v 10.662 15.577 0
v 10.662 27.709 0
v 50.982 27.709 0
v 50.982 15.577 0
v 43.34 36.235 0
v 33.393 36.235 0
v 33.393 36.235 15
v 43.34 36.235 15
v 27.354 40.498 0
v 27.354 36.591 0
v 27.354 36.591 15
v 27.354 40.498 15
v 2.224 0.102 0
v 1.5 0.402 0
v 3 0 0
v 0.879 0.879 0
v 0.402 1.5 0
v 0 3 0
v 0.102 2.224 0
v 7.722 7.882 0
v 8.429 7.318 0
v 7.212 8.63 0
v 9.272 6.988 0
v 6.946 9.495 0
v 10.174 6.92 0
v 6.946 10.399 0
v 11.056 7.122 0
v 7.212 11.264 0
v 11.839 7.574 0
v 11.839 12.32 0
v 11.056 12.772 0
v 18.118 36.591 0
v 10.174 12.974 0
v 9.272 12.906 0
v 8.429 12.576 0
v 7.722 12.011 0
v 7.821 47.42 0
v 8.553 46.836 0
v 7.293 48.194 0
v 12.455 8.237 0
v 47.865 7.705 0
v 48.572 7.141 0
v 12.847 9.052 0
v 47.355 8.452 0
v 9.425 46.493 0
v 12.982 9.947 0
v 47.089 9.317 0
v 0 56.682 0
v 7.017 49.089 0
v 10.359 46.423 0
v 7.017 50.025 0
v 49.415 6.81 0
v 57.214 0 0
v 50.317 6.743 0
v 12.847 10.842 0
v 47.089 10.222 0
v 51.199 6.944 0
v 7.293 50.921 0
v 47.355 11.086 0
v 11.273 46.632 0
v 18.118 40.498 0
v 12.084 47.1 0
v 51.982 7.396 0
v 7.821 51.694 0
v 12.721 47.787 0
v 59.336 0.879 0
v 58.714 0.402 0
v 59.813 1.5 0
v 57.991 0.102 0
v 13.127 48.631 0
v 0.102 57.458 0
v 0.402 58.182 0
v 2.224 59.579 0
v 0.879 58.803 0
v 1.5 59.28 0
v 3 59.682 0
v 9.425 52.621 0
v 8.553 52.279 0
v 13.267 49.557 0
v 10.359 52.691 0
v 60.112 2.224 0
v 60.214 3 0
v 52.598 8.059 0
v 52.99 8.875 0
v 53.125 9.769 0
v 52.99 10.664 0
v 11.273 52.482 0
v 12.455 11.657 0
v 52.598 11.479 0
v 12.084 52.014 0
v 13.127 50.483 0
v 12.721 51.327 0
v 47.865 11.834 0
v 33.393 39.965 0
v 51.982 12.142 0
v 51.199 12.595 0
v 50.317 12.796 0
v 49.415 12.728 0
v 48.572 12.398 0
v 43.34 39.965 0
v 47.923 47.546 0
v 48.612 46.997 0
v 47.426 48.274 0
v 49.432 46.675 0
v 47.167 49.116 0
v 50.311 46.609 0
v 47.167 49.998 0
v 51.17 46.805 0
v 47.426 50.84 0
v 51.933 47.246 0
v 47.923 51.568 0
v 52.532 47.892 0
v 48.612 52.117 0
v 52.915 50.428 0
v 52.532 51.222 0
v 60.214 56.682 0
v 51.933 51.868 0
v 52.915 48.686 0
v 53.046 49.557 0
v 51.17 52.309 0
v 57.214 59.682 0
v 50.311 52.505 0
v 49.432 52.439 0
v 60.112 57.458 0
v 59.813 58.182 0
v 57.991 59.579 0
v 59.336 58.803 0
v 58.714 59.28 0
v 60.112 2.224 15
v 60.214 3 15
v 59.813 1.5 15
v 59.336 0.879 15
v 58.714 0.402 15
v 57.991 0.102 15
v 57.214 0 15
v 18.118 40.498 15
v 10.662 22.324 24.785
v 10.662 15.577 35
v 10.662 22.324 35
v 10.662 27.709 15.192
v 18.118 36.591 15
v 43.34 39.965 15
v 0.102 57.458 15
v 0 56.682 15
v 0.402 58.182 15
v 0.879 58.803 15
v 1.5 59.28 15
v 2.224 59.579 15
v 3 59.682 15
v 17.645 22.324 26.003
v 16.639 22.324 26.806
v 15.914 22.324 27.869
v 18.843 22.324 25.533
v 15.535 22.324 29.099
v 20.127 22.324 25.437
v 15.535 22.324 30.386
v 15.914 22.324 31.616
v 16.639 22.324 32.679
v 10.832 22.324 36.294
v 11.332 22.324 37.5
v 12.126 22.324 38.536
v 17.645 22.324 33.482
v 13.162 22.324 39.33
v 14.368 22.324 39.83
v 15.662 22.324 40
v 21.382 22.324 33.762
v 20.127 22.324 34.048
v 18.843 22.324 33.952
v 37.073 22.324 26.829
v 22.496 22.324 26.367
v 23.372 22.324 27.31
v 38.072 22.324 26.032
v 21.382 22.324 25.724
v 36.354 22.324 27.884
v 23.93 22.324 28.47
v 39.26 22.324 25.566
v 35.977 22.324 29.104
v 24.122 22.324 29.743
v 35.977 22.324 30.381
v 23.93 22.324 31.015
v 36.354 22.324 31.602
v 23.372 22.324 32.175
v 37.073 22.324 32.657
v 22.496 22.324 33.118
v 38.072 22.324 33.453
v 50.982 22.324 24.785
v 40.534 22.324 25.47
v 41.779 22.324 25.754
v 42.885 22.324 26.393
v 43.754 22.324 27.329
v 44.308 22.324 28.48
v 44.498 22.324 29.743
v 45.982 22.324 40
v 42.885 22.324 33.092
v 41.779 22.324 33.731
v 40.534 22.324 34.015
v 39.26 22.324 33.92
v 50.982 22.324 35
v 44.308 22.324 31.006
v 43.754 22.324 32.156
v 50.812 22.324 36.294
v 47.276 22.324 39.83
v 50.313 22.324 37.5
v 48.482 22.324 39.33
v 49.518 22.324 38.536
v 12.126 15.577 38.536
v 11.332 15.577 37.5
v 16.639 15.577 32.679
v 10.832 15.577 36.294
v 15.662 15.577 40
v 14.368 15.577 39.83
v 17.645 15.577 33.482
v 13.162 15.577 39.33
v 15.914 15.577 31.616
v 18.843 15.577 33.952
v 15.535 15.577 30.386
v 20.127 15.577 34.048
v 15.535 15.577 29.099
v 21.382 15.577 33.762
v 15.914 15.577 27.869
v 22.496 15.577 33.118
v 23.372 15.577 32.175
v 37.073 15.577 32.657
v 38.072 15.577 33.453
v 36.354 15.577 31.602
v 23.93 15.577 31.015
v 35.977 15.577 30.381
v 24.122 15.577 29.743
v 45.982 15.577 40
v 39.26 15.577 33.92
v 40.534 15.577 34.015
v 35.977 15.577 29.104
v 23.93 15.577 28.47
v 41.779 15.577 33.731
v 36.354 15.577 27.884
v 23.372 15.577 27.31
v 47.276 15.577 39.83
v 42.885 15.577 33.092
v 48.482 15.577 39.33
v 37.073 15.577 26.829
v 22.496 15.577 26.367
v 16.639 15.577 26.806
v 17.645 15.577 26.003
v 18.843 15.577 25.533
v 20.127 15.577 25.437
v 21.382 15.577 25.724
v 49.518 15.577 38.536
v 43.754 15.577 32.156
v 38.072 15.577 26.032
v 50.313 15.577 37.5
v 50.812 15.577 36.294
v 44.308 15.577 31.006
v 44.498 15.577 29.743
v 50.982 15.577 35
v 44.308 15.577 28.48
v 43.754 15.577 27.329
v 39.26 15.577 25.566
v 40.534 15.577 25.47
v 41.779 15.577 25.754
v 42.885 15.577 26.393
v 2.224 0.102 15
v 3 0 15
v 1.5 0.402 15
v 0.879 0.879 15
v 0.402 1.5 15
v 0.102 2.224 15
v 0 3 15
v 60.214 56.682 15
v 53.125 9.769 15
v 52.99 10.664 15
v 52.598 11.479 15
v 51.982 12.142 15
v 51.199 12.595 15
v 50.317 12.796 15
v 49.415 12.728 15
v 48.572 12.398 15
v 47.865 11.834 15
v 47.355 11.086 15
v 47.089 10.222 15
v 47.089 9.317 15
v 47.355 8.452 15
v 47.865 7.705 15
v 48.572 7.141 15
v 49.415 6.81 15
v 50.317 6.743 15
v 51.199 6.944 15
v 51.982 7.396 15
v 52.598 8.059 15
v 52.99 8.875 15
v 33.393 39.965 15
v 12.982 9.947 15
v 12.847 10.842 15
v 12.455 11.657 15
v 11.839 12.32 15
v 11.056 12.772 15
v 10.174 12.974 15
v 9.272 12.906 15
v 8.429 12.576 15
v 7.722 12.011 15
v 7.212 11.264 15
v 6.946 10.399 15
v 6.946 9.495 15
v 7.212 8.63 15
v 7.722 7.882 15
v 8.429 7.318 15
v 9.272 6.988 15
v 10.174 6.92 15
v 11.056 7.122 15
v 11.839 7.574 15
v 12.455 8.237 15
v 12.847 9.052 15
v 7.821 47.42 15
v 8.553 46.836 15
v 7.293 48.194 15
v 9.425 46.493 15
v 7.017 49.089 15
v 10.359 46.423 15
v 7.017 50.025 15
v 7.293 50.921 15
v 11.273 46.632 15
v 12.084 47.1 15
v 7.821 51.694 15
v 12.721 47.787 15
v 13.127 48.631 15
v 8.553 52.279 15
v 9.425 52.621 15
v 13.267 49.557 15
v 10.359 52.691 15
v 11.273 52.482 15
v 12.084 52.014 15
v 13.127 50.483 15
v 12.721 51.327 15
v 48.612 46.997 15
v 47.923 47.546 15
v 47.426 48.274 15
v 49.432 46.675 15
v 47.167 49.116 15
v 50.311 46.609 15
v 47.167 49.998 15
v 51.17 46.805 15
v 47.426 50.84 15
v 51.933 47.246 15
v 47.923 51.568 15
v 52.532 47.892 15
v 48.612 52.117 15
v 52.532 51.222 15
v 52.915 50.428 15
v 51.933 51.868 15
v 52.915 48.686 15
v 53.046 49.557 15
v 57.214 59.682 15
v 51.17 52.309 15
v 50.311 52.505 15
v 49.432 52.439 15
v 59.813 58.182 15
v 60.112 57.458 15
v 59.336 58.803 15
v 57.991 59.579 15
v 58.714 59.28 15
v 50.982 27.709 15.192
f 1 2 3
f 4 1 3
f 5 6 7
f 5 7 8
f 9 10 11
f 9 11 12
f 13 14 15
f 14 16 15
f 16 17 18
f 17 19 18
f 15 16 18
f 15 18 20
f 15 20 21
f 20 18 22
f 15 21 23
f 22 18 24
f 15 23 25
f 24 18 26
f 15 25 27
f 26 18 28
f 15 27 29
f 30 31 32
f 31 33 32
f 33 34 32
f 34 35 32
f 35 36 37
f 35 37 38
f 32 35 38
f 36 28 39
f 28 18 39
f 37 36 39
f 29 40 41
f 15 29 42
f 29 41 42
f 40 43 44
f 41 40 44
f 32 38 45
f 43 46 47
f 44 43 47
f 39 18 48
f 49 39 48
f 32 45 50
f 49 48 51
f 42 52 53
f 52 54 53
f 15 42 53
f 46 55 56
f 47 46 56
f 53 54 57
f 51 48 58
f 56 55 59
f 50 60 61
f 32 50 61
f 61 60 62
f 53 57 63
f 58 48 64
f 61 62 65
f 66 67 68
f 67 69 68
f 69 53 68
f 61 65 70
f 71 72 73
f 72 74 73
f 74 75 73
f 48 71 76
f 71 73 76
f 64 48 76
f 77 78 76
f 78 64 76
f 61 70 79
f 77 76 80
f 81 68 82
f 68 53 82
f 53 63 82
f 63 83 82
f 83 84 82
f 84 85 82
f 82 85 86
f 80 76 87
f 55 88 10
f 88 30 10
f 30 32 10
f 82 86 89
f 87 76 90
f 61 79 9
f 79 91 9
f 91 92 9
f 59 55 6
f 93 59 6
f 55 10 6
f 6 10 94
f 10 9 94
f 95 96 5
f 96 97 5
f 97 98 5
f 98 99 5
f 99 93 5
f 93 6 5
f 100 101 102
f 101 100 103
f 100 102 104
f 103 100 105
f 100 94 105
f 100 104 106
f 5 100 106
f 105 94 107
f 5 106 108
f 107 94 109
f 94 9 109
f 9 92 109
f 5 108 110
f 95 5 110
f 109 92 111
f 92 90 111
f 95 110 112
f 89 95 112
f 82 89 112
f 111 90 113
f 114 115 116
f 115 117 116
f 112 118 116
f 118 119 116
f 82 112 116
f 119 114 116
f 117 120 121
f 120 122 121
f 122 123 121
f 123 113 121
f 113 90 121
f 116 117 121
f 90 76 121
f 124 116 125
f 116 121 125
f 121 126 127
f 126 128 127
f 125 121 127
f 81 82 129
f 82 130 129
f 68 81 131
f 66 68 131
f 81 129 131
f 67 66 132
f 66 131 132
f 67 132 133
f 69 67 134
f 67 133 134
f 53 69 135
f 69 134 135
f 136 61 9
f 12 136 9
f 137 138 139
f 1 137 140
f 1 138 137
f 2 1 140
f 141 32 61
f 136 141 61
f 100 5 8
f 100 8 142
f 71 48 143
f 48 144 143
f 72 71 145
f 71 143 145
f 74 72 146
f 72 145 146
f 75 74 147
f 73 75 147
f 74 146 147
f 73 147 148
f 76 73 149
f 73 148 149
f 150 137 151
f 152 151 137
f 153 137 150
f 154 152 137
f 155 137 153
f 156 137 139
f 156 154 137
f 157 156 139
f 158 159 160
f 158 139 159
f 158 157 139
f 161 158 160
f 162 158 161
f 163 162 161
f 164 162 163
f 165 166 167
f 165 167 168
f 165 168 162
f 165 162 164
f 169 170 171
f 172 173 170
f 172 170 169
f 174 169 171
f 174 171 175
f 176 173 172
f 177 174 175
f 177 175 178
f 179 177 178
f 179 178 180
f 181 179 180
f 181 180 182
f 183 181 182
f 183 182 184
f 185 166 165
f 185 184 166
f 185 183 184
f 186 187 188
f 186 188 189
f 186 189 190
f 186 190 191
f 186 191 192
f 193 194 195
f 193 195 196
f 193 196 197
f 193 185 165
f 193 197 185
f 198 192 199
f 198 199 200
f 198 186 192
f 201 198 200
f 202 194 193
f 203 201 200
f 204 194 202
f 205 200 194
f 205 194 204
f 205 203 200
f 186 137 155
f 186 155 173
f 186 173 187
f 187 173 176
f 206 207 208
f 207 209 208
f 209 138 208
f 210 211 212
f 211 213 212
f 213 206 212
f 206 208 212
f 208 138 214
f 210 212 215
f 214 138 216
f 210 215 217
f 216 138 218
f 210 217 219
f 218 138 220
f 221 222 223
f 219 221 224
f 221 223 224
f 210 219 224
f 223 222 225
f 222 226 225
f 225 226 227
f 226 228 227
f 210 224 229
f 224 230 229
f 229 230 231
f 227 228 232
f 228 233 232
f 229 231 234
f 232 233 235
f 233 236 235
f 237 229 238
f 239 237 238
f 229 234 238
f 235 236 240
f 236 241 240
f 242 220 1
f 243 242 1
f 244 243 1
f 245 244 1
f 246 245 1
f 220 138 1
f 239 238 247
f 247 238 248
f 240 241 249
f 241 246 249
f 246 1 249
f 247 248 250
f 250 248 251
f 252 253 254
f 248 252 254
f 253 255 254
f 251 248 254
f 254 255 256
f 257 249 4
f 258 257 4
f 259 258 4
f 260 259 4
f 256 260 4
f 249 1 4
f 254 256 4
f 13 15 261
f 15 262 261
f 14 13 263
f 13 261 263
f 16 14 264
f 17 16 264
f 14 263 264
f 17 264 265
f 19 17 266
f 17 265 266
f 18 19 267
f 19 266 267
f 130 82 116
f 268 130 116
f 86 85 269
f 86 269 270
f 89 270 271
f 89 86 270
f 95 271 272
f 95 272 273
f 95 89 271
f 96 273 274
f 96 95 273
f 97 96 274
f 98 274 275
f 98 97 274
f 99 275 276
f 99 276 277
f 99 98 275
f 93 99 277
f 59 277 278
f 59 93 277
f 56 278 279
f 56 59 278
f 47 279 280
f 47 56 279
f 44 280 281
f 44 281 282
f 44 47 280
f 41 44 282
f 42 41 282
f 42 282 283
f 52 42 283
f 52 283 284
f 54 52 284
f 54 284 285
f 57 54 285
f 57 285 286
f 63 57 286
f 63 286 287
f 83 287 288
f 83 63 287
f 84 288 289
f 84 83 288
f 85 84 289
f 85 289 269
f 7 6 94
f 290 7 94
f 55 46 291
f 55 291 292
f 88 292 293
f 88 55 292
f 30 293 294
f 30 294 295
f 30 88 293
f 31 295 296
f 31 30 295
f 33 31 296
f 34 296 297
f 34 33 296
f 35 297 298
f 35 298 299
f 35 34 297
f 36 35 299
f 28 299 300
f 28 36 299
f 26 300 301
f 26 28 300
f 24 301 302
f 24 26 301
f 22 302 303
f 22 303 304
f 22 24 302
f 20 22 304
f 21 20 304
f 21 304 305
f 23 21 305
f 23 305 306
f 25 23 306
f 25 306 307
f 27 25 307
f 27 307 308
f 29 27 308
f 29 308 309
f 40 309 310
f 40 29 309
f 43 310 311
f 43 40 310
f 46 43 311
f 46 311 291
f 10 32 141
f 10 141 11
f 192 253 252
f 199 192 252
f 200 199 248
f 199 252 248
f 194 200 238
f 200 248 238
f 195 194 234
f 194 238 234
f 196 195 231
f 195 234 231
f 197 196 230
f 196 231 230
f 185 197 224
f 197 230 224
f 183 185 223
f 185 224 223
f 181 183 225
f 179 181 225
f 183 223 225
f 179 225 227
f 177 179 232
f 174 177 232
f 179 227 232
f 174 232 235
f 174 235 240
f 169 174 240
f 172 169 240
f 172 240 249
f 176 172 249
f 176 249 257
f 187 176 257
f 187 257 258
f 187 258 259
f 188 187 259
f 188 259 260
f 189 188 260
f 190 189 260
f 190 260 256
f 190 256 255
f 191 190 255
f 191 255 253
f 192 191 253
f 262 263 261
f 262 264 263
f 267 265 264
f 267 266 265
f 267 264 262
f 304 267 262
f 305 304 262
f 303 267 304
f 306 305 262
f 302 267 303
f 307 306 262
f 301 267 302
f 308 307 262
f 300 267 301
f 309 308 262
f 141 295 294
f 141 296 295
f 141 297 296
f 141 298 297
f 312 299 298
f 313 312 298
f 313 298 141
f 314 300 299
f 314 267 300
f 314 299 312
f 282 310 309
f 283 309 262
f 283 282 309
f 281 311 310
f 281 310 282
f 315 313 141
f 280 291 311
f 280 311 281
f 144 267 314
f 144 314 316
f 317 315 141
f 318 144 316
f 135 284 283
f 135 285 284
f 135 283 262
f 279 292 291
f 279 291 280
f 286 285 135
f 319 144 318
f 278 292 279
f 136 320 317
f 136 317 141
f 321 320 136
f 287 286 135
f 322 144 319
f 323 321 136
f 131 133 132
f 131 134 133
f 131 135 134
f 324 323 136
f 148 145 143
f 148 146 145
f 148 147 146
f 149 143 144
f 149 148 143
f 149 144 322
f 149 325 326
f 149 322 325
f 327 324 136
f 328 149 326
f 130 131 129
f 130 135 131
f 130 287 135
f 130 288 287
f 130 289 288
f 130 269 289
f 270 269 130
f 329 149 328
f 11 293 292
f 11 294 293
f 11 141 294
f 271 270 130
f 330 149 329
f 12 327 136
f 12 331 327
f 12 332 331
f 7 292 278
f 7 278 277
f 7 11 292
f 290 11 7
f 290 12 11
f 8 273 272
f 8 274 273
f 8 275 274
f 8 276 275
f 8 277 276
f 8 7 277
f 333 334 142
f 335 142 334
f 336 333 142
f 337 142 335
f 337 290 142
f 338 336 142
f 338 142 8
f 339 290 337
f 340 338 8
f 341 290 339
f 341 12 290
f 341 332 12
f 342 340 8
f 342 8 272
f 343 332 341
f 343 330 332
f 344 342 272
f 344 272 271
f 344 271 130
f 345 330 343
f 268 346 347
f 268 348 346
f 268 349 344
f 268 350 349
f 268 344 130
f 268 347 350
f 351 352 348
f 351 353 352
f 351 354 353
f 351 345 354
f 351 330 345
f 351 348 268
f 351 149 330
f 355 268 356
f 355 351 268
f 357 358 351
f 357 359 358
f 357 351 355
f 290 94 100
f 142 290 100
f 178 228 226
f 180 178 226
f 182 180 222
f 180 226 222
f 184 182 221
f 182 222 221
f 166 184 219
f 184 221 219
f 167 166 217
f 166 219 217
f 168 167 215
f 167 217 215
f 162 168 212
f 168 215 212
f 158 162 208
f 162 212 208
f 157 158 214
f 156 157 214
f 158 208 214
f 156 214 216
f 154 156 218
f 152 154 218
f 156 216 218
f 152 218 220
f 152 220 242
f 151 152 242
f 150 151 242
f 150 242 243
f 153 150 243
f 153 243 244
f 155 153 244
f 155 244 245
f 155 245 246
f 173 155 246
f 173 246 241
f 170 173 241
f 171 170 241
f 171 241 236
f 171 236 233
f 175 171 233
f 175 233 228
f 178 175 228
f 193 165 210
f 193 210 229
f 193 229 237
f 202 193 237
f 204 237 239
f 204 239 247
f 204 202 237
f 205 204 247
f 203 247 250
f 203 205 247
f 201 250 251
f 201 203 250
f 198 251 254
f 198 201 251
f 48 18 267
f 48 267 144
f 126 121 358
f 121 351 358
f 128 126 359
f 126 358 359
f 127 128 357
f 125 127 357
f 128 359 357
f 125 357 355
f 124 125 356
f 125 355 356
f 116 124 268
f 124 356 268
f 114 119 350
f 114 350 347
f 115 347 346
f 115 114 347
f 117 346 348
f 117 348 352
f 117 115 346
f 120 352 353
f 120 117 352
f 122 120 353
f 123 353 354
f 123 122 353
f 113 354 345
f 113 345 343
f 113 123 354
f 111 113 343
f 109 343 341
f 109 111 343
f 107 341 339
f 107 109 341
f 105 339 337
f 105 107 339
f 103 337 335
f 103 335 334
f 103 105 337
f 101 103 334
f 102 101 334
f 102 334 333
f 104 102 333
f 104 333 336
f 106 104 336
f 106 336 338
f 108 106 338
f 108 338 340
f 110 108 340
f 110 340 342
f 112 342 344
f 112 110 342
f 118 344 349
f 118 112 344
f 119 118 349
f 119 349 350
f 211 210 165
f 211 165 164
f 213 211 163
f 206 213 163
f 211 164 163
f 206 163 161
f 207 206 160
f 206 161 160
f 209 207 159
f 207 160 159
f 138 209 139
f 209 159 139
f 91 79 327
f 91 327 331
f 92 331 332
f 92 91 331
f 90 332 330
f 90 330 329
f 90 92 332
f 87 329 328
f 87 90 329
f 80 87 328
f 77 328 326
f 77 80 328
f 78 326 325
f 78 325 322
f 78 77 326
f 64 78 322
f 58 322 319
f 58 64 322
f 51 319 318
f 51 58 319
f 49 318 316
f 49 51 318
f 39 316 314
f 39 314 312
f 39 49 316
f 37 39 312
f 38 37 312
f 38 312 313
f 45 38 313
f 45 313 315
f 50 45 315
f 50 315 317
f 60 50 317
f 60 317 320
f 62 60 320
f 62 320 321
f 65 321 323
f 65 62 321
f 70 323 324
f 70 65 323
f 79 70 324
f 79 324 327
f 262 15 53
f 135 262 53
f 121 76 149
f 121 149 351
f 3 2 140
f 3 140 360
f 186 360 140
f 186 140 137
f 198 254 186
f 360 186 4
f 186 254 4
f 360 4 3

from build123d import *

# Parameters (mm, degrees)
SKETCH001_W     = 40.320626
SKETCH001_H     = 12.132678
PAD001_DEPTH    = 40
SKETCH002_R     = 4.317623
SKETCH002_R_2   = 4.284413
POCKET_DEPTH    = 20
POCKET001_DEPTH = 50
FILLET_R        = 5
FILLET001_R     = 5
SKETCH_W        = 60.214462
SKETCH_H        = 59.681602
SKETCH_R        = 3.142494
SKETCH_R_2      = 2.956232
SKETCH_R_3      = 3.035228
SKETCH_R_4      = 3.035232
SKETCH_W_2      = 9.236439
SKETCH_H_2      = 3.907723
SKETCH_W_3      = 9.946926
SKETCH_H_3      = 3.730095
PAD_DEPTH       = 15
FILLET002_R     = 3
FILLET003_R     = 3
FILLET004_R     = 3
FILLET005_R     = 3


with BuildPart() as fillet001:
    # Sketch001 → Pad001 (new body)
    with BuildSketch(Plane.XY):
        with Locations((30.822077, 21.642973)):
            Rectangle(SKETCH001_W, SKETCH001_H)
    extrude(amount=PAD001_DEPTH)

    # Sketch002 → Pocket (cut)
    with BuildSketch(Plane.XZ.offset(-15.576634)):
        with Locations((19.804171, 29.742664)):
            Circle(SKETCH002_R)
        with Locations((40.213741, 29.742664)):
            Circle(SKETCH002_R_2)
    extrude(amount=-POCKET_DEPTH, mode=Mode.SUBTRACT)

    # Sketch004 → Pocket001 (cut)
    with BuildSketch(Plane.YZ.offset(50.98239)):
        Polygon((28.077049, 14.53677), (22.323629, 24.785055), (22.323629, 47.259361), (55.765396, 45.281624), align=None)
    extrude(amount=-POCKET001_DEPTH, mode=Mode.SUBTRACT)

    # Fillet
    fillet_edges = [fillet001.edges().sort_by_distance(p)[0] for p in [
        (50.98239, 18.950131, 40),
    ]]
    fillet(fillet_edges, radius=FILLET_R)

    # Fillet001
    fillet001_edges = [fillet001.edges().sort_by_distance(p)[0] for p in [
        (10.661764, 18.950132, 40),
    ]]
    fillet(fillet001_edges, radius=FILLET001_R)


with BuildPart() as fillet005:
    # Sketch → Pad (new body)
    with BuildSketch(Plane.XY):
        with Locations((30.107231, 29.840801)):
            Rectangle(SKETCH_W, SKETCH_H)
        with Locations((10.124556, 49.557049)):
            Circle(SKETCH_R, mode=Mode.SUBTRACT)
        with Locations((50.089931, 49.557049)):
            Circle(SKETCH_R_2, mode=Mode.SUBTRACT)
        with Locations((9.946939, 9.946931)):
            Circle(SKETCH_R_3, mode=Mode.SUBTRACT)
        with Locations((50.089931, 9.769306)):
            Circle(SKETCH_R_4, mode=Mode.SUBTRACT)
        with Locations((22.735851, 38.544372)):
            Rectangle(SKETCH_W_2, SKETCH_H_2, mode=Mode.SUBTRACT)
        with Locations((38.366743, 38.100312)):
            Rectangle(SKETCH_W_3, SKETCH_H_3, mode=Mode.SUBTRACT)
    extrude(amount=PAD_DEPTH)

    # Fillet002
    fillet002_edges = [fillet005.edges().sort_by_distance(p)[0] for p in [
        (60.214462, 59.681602, 7.5),
    ]]
    fillet(fillet002_edges, radius=FILLET002_R)

    # Fillet003
    fillet003_edges = [fillet005.edges().sort_by_distance(p)[0] for p in [
        (60.214462, 0, 7.5),
    ]]
    fillet(fillet003_edges, radius=FILLET003_R)

    # Fillet004
    fillet004_edges = [fillet005.edges().sort_by_distance(p)[0] for p in [
        (0, 0, 7.5),
    ]]
    fillet(fillet004_edges, radius=FILLET004_R)

    # Fillet005
    fillet005_edges = [fillet005.edges().sort_by_distance(p)[0] for p in [
        (0, 59.681602, 7.5),
    ]]
    fillet(fillet005_edges, radius=FILLET005_R)


solid = Compound([fillet001.part, fillet005.part])
